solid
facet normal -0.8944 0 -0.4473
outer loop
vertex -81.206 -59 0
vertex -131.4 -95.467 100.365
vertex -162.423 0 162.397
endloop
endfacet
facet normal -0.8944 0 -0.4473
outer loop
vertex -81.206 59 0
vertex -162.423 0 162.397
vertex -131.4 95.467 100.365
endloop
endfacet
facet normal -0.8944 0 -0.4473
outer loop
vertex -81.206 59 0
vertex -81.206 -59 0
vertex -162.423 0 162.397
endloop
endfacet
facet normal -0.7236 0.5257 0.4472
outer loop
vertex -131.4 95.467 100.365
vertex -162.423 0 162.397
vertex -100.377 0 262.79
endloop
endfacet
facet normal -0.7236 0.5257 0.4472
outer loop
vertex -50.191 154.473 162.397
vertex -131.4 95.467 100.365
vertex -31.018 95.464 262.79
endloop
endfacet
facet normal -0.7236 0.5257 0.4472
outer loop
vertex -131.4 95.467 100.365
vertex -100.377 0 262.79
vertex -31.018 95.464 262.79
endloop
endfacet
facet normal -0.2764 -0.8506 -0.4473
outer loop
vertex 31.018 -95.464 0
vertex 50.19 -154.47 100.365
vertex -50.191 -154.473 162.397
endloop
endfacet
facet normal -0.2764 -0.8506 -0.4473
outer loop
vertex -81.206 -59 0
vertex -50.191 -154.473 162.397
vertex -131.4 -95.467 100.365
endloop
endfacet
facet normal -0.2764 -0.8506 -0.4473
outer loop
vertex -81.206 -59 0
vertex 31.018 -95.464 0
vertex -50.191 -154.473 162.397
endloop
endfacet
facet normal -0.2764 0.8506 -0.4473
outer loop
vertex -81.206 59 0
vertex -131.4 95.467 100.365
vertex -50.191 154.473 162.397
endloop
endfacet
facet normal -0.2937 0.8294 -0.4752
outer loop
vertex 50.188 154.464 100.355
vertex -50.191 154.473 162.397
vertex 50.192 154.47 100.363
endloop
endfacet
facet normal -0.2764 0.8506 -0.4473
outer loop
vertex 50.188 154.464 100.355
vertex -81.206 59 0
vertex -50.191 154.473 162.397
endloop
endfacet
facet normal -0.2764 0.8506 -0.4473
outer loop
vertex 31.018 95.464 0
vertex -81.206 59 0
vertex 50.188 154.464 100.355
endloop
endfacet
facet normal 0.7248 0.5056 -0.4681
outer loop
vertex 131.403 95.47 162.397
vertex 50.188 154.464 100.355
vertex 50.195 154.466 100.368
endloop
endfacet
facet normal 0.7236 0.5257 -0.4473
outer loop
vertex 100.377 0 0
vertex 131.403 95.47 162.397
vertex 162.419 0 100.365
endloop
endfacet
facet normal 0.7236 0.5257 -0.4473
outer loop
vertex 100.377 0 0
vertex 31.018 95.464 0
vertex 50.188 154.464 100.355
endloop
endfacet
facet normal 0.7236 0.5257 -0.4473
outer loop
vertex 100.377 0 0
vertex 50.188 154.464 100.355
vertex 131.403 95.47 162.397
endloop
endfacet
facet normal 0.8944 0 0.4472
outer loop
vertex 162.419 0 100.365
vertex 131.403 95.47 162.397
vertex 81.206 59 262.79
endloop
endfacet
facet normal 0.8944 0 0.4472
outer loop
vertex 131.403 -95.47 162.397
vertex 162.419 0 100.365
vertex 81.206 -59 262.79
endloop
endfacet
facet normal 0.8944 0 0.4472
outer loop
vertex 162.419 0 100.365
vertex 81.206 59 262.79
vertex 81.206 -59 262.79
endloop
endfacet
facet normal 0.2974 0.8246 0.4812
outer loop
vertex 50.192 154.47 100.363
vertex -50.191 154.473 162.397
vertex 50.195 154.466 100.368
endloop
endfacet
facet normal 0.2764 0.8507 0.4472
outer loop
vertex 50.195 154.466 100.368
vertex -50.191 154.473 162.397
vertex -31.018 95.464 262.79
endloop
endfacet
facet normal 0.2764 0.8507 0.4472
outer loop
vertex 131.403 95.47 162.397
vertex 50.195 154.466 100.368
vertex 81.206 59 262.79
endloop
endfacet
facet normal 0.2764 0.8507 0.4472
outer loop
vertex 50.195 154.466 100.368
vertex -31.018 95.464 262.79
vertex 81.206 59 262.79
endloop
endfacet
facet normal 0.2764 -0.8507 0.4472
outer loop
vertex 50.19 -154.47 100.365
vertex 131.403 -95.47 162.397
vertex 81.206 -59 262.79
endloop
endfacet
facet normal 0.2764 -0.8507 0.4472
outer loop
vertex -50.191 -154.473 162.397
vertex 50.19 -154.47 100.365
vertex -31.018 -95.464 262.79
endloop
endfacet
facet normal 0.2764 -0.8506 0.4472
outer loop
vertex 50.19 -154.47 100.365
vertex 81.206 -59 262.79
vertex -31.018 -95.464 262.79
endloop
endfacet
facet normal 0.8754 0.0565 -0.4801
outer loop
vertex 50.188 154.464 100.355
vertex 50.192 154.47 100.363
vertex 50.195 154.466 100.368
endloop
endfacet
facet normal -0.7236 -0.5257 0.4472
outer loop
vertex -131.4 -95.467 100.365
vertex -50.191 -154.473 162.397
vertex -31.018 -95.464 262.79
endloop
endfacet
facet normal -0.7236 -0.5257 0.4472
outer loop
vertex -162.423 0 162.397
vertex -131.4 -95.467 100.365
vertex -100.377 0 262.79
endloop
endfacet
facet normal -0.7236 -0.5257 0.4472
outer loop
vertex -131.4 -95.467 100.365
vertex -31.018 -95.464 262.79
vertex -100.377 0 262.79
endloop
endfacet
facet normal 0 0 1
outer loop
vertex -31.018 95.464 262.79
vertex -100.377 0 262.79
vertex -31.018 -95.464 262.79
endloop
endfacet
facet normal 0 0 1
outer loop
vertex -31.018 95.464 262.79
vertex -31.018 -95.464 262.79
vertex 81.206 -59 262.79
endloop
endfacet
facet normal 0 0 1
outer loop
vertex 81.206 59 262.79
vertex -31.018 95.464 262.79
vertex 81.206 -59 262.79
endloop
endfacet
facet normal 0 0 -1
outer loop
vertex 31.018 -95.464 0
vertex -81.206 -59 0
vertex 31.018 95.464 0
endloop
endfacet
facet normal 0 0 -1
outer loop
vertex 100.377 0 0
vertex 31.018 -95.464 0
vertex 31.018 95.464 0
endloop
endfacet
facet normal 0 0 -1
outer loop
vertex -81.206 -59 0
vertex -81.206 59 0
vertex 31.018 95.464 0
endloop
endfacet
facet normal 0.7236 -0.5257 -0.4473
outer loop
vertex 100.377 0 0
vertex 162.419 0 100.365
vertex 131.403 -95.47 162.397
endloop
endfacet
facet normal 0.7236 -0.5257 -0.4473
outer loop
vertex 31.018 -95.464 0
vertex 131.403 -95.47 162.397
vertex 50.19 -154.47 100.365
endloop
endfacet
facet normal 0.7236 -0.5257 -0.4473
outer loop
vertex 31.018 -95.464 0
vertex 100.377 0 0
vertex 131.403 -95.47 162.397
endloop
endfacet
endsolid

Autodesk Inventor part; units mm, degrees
ref_plane "YZ Plane" through (0, 0, 0) normal (1, 0, 0) x (0, 1, 0)
ref_plane "XZ Plane" through (0, 0, 0) normal (0, 1, 0) x (-1, 0, 0)
ref_plane "XY Plane" through (0, 0, 0) normal (0, 0, 1) x (1, 0, 0)
sketch "Boceto2" plane through (0, 0, 0) normal (0, 0, 1) x (1, 0, 0)
  line L0 (-81.2065, -59) -> (-81.2065, 59)
  line L1 (-81.2065, 59) -> (31.0181, 95.464)
  line L2 (31.0181, 95.464) -> (100.3768, 0)
  line L3 (100.3768, 0) -> (31.0181, -95.464)
  line L4 (31.0181, -95.464) -> (-81.2065, -59)
  line L5 (0, 0) -> (-162.4131, 0)
  line L6 (-162.4131, 0) -> (-162.4131, 162.4131)
  line L7 (-162.4131, 162.4131) -> (0, 162.4131)
  line L8 (0, 162.4131) -> (0, 0)
  line L9 (-162.4131, 162.4131) -> (-81.2065, 0)
  dimension "d3" = 118
  dimension "d4" = 262.7899
  dimension "d5" = 26.565
extrude "Extrusión1" add sketch "Boceto2" along normal blind 262.7899 draft 26.57 contours L0 L5 L8 L1 L2 L3 L4 | L0 L1 L8 L5
sketch "Boceto3" plane through (0, 0, 262.7899) normal (0, 0, 1) x (1, 0, 0)
  line L0 (-31.0181, 95.464) -> (81.2065, 59)
  line L1 (81.2065, 59) -> (81.2065, -59)
  line L2 (81.2065, -59) -> (-31.0181, -95.464)
  line L3 (-31.0181, -95.464) -> (-100.3768, 0)
  line L4 (-100.3768, 0) -> (-31.0181, 95.464)
  point P0 (0, 0)
  point P1 (0, 0)
  dimension "d8" = 118
extrude "Extrusión2" cut sketch "Boceto3" against normal blind 262.7899 draft 26.565 keep common part
ref_plane "Plano de trabajo1" through (-131.3998, -95.4675, 100.3648) normal (0.4910723, 0.3567849, 0.7947028) x (0.8506859, 0.0000184, -0.5256744)
feature "Dividir1" [suppressed]
ref_plane "Plano de trabajo2" through (31.0181, -95.464, 0) normal (-0.4910723, -0.3567849, -0.7947028) x (-0.8506859, -0.0000184, 0.5256744)
ref_plane "Plano de trabajo3" through (31.0181, -95.464, 0) normal (0.2628656, 0.809017, -0.5257311) x (-0.9510565, 0.309017, 0)
ref_plane "Plano de trabajo4" through (-81.2065, -59, 0) normal (-0.5877853, 0.809017, 0) x (-0.4253919, -0.3090653, 0.8506)
ref_plane "Plano de trabajo5" through (-81.2065, -59, 0) normal (0.8506508, 0, -0.5257311) x (0, 1, 0)
equation "\"d6\" = d4"
equation "\"d9\" = d4"
equation "\"d10\" = d5"
properties part number "Dodecaedro"
